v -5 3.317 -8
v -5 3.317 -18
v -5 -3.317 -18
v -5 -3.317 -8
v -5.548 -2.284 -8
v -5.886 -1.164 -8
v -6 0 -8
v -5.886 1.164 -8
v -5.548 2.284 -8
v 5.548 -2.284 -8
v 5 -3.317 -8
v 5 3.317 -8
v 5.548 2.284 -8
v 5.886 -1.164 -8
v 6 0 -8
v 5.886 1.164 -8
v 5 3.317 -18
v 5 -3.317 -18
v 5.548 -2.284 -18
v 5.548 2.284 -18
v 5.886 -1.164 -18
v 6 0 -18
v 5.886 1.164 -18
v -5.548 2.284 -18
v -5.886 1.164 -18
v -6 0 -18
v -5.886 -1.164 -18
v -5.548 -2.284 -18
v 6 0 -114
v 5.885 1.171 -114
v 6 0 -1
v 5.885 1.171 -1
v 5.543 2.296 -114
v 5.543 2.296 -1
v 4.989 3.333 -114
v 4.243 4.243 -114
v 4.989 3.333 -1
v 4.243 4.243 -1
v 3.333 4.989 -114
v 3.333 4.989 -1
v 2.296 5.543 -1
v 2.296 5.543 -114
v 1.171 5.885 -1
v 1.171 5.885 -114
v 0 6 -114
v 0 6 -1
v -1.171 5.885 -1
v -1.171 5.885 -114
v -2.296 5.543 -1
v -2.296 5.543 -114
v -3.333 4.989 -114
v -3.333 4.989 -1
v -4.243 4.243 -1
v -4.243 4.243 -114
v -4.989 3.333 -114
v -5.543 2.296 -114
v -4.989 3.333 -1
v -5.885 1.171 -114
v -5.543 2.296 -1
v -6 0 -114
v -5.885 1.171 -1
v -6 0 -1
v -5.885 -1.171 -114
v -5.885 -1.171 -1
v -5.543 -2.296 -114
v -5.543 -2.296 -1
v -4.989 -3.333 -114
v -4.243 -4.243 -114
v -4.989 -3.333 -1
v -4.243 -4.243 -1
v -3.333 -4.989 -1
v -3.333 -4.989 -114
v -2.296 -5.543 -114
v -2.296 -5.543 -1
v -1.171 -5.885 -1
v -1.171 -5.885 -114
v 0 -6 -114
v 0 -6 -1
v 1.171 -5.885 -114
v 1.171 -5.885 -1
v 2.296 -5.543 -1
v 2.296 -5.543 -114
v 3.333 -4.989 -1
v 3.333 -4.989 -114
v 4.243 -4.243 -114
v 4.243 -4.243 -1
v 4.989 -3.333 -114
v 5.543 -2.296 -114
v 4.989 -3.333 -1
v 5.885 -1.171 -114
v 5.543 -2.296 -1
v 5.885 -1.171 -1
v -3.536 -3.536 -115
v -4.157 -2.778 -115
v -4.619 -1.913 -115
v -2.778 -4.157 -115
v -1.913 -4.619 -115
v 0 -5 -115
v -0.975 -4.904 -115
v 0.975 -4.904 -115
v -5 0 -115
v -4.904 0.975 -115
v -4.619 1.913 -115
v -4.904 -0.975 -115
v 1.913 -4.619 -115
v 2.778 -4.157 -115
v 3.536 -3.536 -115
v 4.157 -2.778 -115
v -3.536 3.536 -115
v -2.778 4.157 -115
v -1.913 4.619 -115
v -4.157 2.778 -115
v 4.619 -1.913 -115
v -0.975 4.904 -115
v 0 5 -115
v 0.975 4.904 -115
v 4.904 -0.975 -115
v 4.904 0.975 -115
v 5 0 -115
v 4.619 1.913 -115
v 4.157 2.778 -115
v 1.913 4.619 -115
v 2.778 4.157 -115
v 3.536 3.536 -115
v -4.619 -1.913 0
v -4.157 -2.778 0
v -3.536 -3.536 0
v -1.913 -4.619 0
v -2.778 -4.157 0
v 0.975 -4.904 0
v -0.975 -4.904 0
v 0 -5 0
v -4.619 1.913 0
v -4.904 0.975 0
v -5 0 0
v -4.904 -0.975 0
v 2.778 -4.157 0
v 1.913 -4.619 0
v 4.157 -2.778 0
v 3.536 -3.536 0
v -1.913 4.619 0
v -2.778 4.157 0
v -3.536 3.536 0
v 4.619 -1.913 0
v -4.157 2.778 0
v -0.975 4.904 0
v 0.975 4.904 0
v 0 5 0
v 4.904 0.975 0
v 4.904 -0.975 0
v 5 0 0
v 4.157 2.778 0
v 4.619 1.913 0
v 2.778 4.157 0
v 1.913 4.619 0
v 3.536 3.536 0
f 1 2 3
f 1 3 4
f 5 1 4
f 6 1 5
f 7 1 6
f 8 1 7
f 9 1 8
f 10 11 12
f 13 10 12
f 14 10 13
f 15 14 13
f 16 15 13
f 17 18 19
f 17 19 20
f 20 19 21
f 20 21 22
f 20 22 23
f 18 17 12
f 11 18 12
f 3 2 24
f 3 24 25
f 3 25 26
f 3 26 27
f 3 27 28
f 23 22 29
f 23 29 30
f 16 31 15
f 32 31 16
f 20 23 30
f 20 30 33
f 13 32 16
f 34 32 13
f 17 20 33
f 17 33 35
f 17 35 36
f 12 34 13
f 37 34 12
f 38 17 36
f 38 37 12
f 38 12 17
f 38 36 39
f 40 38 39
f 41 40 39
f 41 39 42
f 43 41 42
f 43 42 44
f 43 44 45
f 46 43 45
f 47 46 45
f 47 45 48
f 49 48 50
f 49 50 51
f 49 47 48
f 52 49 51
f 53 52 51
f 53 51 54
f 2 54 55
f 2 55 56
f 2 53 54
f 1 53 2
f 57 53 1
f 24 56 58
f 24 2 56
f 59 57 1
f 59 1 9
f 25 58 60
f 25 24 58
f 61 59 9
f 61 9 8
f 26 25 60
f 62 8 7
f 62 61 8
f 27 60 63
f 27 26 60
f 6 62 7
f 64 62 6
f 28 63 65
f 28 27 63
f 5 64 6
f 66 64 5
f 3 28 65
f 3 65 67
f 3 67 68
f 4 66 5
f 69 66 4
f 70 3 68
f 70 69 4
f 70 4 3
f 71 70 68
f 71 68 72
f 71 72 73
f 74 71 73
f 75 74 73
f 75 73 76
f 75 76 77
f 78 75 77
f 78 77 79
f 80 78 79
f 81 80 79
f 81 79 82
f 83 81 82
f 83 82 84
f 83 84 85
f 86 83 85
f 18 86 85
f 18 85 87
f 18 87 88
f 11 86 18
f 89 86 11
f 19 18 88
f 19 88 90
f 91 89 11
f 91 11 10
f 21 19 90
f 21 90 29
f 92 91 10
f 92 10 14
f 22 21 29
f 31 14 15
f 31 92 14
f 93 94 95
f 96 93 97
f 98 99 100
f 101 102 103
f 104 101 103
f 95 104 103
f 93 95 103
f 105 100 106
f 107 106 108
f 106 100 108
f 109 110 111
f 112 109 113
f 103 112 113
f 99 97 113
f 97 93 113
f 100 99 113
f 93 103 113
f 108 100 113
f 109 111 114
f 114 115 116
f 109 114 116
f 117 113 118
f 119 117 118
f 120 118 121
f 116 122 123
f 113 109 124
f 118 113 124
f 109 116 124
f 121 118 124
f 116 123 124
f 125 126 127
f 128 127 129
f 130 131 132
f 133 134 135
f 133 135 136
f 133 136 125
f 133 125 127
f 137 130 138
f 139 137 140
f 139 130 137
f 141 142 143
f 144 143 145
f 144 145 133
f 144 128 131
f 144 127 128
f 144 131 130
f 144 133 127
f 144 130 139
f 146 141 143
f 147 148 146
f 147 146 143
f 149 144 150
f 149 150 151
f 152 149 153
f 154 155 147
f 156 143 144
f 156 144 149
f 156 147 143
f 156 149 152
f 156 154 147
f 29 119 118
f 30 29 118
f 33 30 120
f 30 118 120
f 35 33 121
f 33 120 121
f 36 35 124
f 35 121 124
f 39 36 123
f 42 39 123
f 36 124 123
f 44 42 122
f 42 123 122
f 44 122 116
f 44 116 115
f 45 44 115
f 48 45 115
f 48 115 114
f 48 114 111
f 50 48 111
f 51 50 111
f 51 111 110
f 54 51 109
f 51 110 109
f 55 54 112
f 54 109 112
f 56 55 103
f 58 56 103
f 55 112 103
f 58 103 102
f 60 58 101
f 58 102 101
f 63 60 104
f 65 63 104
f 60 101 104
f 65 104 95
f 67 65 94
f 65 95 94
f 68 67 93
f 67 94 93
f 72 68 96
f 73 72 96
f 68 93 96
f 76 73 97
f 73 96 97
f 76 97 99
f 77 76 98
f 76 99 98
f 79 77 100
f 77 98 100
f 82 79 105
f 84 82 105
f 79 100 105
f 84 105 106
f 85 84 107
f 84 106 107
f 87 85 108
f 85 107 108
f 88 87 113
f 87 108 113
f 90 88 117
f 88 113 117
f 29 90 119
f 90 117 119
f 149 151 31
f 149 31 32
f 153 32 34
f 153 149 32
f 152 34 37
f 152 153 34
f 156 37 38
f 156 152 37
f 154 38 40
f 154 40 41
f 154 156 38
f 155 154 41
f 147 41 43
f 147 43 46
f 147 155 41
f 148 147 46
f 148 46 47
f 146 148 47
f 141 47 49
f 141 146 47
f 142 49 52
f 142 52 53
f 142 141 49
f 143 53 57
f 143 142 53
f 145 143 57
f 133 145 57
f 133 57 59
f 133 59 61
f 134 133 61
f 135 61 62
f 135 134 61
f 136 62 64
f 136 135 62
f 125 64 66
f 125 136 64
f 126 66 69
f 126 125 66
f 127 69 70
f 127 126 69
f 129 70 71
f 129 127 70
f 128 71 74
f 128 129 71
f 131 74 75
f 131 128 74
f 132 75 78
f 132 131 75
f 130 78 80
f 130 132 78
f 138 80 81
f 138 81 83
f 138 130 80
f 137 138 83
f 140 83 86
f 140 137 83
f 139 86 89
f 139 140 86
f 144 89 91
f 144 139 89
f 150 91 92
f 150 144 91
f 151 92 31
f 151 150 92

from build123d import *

# Parameters (mm, degrees)
F0_R          = 6
F1_DEPTH      = 115
F2_W          = 1
F2_H          = 10
F3_DEPTH      = 6.001
F3_DEPTH_BACK = 6.001
F4_SIZE2      = 1
F4_SIZE       = 1


with BuildPart() as f1:
    # F0 (on Top) → F1 (new body)
    with BuildSketch(Plane.XY):
        Circle(F0_R)
    extrude(amount=-F1_DEPTH)

    # F2 (on Front) → F3 (cut, two sides)
    with BuildSketch(Plane.XZ) as f3_sk:
        with Locations((5.5, -13)):
            Rectangle(F2_W, F2_H)
        with Locations((-5.5, -13)):
            Rectangle(F2_W, F2_H)
    extrude(amount=-F3_DEPTH, mode=Mode.SUBTRACT)
    extrude(f3_sk.sketch, amount=F3_DEPTH_BACK, mode=Mode.SUBTRACT)

    # F4
    f4_edges = [f1.edges().sort_by_distance(p)[0] for p in [
        (-6, 0, 0),
        (-6, 0, -115),
    ]]
    chamfer(f4_edges, length=F4_SIZE, length2=F4_SIZE2)


solid = f1.part
